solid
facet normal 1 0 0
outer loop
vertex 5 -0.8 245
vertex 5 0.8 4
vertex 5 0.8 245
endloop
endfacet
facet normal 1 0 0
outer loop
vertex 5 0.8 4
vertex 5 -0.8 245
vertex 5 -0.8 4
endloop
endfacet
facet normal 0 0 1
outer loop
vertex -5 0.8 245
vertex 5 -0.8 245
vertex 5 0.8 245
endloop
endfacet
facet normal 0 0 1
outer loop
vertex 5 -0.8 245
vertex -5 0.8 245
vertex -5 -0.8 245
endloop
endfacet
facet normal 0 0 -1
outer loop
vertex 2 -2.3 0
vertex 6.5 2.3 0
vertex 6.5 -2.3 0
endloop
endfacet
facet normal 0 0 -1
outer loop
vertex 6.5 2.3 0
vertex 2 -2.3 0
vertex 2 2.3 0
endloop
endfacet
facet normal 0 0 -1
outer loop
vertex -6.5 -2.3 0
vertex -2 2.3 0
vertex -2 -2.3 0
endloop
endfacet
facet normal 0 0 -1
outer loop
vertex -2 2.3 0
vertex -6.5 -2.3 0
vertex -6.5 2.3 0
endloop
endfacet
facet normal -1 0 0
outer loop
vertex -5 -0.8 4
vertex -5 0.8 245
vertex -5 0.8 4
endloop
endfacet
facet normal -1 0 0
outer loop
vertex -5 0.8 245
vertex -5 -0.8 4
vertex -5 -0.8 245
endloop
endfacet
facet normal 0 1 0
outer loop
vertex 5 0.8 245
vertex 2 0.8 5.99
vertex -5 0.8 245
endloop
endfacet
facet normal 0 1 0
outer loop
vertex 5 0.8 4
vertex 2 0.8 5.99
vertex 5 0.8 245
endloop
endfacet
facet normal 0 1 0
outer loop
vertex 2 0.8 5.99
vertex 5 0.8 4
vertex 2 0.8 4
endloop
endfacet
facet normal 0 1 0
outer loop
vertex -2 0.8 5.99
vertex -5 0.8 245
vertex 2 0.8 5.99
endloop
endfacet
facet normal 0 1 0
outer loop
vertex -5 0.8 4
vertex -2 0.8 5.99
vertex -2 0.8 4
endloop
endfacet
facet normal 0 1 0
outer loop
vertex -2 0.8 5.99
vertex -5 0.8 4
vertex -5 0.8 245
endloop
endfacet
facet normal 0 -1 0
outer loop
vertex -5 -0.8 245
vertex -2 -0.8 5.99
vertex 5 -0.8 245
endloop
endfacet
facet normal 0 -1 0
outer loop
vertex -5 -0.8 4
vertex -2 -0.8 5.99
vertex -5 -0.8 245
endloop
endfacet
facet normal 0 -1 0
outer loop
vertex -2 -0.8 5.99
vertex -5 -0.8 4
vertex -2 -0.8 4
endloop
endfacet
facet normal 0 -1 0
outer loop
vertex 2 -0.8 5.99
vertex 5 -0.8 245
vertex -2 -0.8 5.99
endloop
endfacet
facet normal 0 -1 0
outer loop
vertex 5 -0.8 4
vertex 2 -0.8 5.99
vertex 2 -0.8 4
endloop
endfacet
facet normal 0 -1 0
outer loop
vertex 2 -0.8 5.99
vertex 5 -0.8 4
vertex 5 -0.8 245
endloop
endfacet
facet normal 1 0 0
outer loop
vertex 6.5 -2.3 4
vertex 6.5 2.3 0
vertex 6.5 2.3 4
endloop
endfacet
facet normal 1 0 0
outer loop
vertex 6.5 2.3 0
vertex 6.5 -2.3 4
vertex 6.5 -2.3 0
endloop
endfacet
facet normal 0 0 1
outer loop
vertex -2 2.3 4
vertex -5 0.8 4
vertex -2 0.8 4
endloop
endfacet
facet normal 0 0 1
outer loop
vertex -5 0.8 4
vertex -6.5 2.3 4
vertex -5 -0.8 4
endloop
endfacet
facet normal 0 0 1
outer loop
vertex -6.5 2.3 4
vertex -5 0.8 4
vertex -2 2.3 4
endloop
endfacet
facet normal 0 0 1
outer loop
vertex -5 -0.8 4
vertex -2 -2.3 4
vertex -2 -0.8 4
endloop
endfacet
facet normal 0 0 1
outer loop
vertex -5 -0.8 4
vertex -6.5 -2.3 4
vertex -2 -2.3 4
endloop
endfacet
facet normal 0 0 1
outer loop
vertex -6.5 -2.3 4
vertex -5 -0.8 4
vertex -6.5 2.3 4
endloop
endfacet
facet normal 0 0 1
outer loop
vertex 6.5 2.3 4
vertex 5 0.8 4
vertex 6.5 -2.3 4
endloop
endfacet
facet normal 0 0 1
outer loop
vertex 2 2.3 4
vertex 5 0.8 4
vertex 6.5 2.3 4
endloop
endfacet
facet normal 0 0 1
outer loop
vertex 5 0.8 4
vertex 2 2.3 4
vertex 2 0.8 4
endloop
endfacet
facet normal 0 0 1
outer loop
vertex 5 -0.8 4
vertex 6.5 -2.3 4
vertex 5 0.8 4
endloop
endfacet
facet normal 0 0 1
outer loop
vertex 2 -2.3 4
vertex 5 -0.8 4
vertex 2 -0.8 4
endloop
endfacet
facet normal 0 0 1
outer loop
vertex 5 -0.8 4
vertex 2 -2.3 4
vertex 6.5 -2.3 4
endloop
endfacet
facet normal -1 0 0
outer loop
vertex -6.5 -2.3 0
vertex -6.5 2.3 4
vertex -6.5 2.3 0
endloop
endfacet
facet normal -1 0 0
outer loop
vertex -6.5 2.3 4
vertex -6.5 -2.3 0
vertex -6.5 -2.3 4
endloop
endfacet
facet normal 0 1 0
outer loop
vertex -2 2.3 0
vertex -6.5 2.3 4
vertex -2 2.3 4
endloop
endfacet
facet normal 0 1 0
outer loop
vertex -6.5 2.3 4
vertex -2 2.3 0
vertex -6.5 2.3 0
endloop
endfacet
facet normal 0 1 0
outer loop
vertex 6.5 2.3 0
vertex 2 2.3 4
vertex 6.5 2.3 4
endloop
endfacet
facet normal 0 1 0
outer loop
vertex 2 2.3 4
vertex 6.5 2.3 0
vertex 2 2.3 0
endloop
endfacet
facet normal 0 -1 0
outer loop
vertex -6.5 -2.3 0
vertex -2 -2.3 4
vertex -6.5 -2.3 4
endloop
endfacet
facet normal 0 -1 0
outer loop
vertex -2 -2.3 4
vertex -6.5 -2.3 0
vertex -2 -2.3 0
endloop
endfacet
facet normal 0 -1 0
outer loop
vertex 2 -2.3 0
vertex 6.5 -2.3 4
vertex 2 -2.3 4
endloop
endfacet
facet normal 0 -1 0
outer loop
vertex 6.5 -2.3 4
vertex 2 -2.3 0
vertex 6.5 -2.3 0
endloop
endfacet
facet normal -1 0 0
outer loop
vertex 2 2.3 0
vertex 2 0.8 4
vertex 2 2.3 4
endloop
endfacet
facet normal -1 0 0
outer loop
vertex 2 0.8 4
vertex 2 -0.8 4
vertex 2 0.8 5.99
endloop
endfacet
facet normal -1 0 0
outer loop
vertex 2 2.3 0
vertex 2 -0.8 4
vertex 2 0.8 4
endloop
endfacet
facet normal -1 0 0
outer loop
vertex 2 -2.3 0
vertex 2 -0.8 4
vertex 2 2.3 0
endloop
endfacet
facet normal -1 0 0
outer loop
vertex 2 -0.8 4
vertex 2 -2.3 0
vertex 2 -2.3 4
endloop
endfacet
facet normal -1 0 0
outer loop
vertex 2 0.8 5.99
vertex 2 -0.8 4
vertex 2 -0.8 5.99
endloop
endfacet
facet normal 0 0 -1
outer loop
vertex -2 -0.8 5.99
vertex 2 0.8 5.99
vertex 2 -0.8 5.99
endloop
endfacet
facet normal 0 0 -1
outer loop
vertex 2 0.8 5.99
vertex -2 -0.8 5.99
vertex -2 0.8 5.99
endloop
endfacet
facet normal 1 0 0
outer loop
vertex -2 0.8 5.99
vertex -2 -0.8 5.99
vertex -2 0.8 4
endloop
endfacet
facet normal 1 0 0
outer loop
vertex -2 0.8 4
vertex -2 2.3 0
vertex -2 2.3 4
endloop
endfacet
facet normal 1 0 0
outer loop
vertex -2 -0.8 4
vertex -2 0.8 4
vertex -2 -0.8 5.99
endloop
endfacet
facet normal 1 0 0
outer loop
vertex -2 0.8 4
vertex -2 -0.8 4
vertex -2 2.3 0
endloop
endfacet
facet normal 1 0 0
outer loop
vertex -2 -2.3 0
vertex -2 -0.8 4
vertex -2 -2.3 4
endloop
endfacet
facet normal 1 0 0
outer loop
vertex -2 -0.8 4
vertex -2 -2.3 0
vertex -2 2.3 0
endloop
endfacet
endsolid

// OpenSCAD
// Two small parts for the beam:
//   spine  - a thin bar the WS2812B strip sticks to, slid up inside the tube (strip faces
//            sideways so light bounces around the wall instead of shining straight up)
//   socket - a puck glued to the arena floor; the tube's foot drops in, wires exit the slot
//
//   openscad -o exports/beam_spine.stl  -D part=\"spine\"  strip_holder.scad
//   openscad -o exports/beam_socket.stl -D part=\"socket\" strip_holder.scad

part = "spine";

tube_id   = 12 - 2 * 0.45;   // inner diameter of the vase-mode tube (one 0.45 mm wall)
strip_w   = 10;              // WS2812B 60/m strip is 10 mm wide
led_count = 14;              // 14 x 16.67 = 233 mm of strip; 15 would not fit inside the 250 mm tube
led_pitch = 16.67;           // 60 LEDs per metre
spine_t   = 1.6;
spine_h   = 245;             // must be shorter than the tube interior (250 - foot 3 - tip): strip is 233 + wire notch

foot_d    = 16;
socket_d  = 30;
socket_h  = 8;

$fn = 96;

module spine() {
    w = min(strip_w, tube_id - 0.6);
    difference() {
        union() {
            // bar
            translate([-w / 2, -spine_t / 2, 0]) cube([w, spine_t, spine_h]);
            // feet: 13 mm wide, wider than the 11 mm bore, so they seat in the tube's 16->12 mm cone
            translate([-13 / 2, -spine_t / 2 - 1.5, 0]) cube([13, spine_t + 3, 4]);
        }
        // wire notch at the bottom
        translate([-2, -3, -0.01]) cube([4, 6, 6]);
    }
}

module socket() {
    difference() {
        cylinder(d = socket_d, h = socket_h);
        translate([0, 0, 2]) cylinder(d = foot_d + 0.4, h = socket_h);
        // wire slot out the side and down through the floor
        translate([0, -3, 2]) cube([socket_d, 6, socket_h]);
        translate([0, 0, -0.01]) cylinder(d = 8, h = 3);
    }
}

if (part == "spine") spine();
else socket();
